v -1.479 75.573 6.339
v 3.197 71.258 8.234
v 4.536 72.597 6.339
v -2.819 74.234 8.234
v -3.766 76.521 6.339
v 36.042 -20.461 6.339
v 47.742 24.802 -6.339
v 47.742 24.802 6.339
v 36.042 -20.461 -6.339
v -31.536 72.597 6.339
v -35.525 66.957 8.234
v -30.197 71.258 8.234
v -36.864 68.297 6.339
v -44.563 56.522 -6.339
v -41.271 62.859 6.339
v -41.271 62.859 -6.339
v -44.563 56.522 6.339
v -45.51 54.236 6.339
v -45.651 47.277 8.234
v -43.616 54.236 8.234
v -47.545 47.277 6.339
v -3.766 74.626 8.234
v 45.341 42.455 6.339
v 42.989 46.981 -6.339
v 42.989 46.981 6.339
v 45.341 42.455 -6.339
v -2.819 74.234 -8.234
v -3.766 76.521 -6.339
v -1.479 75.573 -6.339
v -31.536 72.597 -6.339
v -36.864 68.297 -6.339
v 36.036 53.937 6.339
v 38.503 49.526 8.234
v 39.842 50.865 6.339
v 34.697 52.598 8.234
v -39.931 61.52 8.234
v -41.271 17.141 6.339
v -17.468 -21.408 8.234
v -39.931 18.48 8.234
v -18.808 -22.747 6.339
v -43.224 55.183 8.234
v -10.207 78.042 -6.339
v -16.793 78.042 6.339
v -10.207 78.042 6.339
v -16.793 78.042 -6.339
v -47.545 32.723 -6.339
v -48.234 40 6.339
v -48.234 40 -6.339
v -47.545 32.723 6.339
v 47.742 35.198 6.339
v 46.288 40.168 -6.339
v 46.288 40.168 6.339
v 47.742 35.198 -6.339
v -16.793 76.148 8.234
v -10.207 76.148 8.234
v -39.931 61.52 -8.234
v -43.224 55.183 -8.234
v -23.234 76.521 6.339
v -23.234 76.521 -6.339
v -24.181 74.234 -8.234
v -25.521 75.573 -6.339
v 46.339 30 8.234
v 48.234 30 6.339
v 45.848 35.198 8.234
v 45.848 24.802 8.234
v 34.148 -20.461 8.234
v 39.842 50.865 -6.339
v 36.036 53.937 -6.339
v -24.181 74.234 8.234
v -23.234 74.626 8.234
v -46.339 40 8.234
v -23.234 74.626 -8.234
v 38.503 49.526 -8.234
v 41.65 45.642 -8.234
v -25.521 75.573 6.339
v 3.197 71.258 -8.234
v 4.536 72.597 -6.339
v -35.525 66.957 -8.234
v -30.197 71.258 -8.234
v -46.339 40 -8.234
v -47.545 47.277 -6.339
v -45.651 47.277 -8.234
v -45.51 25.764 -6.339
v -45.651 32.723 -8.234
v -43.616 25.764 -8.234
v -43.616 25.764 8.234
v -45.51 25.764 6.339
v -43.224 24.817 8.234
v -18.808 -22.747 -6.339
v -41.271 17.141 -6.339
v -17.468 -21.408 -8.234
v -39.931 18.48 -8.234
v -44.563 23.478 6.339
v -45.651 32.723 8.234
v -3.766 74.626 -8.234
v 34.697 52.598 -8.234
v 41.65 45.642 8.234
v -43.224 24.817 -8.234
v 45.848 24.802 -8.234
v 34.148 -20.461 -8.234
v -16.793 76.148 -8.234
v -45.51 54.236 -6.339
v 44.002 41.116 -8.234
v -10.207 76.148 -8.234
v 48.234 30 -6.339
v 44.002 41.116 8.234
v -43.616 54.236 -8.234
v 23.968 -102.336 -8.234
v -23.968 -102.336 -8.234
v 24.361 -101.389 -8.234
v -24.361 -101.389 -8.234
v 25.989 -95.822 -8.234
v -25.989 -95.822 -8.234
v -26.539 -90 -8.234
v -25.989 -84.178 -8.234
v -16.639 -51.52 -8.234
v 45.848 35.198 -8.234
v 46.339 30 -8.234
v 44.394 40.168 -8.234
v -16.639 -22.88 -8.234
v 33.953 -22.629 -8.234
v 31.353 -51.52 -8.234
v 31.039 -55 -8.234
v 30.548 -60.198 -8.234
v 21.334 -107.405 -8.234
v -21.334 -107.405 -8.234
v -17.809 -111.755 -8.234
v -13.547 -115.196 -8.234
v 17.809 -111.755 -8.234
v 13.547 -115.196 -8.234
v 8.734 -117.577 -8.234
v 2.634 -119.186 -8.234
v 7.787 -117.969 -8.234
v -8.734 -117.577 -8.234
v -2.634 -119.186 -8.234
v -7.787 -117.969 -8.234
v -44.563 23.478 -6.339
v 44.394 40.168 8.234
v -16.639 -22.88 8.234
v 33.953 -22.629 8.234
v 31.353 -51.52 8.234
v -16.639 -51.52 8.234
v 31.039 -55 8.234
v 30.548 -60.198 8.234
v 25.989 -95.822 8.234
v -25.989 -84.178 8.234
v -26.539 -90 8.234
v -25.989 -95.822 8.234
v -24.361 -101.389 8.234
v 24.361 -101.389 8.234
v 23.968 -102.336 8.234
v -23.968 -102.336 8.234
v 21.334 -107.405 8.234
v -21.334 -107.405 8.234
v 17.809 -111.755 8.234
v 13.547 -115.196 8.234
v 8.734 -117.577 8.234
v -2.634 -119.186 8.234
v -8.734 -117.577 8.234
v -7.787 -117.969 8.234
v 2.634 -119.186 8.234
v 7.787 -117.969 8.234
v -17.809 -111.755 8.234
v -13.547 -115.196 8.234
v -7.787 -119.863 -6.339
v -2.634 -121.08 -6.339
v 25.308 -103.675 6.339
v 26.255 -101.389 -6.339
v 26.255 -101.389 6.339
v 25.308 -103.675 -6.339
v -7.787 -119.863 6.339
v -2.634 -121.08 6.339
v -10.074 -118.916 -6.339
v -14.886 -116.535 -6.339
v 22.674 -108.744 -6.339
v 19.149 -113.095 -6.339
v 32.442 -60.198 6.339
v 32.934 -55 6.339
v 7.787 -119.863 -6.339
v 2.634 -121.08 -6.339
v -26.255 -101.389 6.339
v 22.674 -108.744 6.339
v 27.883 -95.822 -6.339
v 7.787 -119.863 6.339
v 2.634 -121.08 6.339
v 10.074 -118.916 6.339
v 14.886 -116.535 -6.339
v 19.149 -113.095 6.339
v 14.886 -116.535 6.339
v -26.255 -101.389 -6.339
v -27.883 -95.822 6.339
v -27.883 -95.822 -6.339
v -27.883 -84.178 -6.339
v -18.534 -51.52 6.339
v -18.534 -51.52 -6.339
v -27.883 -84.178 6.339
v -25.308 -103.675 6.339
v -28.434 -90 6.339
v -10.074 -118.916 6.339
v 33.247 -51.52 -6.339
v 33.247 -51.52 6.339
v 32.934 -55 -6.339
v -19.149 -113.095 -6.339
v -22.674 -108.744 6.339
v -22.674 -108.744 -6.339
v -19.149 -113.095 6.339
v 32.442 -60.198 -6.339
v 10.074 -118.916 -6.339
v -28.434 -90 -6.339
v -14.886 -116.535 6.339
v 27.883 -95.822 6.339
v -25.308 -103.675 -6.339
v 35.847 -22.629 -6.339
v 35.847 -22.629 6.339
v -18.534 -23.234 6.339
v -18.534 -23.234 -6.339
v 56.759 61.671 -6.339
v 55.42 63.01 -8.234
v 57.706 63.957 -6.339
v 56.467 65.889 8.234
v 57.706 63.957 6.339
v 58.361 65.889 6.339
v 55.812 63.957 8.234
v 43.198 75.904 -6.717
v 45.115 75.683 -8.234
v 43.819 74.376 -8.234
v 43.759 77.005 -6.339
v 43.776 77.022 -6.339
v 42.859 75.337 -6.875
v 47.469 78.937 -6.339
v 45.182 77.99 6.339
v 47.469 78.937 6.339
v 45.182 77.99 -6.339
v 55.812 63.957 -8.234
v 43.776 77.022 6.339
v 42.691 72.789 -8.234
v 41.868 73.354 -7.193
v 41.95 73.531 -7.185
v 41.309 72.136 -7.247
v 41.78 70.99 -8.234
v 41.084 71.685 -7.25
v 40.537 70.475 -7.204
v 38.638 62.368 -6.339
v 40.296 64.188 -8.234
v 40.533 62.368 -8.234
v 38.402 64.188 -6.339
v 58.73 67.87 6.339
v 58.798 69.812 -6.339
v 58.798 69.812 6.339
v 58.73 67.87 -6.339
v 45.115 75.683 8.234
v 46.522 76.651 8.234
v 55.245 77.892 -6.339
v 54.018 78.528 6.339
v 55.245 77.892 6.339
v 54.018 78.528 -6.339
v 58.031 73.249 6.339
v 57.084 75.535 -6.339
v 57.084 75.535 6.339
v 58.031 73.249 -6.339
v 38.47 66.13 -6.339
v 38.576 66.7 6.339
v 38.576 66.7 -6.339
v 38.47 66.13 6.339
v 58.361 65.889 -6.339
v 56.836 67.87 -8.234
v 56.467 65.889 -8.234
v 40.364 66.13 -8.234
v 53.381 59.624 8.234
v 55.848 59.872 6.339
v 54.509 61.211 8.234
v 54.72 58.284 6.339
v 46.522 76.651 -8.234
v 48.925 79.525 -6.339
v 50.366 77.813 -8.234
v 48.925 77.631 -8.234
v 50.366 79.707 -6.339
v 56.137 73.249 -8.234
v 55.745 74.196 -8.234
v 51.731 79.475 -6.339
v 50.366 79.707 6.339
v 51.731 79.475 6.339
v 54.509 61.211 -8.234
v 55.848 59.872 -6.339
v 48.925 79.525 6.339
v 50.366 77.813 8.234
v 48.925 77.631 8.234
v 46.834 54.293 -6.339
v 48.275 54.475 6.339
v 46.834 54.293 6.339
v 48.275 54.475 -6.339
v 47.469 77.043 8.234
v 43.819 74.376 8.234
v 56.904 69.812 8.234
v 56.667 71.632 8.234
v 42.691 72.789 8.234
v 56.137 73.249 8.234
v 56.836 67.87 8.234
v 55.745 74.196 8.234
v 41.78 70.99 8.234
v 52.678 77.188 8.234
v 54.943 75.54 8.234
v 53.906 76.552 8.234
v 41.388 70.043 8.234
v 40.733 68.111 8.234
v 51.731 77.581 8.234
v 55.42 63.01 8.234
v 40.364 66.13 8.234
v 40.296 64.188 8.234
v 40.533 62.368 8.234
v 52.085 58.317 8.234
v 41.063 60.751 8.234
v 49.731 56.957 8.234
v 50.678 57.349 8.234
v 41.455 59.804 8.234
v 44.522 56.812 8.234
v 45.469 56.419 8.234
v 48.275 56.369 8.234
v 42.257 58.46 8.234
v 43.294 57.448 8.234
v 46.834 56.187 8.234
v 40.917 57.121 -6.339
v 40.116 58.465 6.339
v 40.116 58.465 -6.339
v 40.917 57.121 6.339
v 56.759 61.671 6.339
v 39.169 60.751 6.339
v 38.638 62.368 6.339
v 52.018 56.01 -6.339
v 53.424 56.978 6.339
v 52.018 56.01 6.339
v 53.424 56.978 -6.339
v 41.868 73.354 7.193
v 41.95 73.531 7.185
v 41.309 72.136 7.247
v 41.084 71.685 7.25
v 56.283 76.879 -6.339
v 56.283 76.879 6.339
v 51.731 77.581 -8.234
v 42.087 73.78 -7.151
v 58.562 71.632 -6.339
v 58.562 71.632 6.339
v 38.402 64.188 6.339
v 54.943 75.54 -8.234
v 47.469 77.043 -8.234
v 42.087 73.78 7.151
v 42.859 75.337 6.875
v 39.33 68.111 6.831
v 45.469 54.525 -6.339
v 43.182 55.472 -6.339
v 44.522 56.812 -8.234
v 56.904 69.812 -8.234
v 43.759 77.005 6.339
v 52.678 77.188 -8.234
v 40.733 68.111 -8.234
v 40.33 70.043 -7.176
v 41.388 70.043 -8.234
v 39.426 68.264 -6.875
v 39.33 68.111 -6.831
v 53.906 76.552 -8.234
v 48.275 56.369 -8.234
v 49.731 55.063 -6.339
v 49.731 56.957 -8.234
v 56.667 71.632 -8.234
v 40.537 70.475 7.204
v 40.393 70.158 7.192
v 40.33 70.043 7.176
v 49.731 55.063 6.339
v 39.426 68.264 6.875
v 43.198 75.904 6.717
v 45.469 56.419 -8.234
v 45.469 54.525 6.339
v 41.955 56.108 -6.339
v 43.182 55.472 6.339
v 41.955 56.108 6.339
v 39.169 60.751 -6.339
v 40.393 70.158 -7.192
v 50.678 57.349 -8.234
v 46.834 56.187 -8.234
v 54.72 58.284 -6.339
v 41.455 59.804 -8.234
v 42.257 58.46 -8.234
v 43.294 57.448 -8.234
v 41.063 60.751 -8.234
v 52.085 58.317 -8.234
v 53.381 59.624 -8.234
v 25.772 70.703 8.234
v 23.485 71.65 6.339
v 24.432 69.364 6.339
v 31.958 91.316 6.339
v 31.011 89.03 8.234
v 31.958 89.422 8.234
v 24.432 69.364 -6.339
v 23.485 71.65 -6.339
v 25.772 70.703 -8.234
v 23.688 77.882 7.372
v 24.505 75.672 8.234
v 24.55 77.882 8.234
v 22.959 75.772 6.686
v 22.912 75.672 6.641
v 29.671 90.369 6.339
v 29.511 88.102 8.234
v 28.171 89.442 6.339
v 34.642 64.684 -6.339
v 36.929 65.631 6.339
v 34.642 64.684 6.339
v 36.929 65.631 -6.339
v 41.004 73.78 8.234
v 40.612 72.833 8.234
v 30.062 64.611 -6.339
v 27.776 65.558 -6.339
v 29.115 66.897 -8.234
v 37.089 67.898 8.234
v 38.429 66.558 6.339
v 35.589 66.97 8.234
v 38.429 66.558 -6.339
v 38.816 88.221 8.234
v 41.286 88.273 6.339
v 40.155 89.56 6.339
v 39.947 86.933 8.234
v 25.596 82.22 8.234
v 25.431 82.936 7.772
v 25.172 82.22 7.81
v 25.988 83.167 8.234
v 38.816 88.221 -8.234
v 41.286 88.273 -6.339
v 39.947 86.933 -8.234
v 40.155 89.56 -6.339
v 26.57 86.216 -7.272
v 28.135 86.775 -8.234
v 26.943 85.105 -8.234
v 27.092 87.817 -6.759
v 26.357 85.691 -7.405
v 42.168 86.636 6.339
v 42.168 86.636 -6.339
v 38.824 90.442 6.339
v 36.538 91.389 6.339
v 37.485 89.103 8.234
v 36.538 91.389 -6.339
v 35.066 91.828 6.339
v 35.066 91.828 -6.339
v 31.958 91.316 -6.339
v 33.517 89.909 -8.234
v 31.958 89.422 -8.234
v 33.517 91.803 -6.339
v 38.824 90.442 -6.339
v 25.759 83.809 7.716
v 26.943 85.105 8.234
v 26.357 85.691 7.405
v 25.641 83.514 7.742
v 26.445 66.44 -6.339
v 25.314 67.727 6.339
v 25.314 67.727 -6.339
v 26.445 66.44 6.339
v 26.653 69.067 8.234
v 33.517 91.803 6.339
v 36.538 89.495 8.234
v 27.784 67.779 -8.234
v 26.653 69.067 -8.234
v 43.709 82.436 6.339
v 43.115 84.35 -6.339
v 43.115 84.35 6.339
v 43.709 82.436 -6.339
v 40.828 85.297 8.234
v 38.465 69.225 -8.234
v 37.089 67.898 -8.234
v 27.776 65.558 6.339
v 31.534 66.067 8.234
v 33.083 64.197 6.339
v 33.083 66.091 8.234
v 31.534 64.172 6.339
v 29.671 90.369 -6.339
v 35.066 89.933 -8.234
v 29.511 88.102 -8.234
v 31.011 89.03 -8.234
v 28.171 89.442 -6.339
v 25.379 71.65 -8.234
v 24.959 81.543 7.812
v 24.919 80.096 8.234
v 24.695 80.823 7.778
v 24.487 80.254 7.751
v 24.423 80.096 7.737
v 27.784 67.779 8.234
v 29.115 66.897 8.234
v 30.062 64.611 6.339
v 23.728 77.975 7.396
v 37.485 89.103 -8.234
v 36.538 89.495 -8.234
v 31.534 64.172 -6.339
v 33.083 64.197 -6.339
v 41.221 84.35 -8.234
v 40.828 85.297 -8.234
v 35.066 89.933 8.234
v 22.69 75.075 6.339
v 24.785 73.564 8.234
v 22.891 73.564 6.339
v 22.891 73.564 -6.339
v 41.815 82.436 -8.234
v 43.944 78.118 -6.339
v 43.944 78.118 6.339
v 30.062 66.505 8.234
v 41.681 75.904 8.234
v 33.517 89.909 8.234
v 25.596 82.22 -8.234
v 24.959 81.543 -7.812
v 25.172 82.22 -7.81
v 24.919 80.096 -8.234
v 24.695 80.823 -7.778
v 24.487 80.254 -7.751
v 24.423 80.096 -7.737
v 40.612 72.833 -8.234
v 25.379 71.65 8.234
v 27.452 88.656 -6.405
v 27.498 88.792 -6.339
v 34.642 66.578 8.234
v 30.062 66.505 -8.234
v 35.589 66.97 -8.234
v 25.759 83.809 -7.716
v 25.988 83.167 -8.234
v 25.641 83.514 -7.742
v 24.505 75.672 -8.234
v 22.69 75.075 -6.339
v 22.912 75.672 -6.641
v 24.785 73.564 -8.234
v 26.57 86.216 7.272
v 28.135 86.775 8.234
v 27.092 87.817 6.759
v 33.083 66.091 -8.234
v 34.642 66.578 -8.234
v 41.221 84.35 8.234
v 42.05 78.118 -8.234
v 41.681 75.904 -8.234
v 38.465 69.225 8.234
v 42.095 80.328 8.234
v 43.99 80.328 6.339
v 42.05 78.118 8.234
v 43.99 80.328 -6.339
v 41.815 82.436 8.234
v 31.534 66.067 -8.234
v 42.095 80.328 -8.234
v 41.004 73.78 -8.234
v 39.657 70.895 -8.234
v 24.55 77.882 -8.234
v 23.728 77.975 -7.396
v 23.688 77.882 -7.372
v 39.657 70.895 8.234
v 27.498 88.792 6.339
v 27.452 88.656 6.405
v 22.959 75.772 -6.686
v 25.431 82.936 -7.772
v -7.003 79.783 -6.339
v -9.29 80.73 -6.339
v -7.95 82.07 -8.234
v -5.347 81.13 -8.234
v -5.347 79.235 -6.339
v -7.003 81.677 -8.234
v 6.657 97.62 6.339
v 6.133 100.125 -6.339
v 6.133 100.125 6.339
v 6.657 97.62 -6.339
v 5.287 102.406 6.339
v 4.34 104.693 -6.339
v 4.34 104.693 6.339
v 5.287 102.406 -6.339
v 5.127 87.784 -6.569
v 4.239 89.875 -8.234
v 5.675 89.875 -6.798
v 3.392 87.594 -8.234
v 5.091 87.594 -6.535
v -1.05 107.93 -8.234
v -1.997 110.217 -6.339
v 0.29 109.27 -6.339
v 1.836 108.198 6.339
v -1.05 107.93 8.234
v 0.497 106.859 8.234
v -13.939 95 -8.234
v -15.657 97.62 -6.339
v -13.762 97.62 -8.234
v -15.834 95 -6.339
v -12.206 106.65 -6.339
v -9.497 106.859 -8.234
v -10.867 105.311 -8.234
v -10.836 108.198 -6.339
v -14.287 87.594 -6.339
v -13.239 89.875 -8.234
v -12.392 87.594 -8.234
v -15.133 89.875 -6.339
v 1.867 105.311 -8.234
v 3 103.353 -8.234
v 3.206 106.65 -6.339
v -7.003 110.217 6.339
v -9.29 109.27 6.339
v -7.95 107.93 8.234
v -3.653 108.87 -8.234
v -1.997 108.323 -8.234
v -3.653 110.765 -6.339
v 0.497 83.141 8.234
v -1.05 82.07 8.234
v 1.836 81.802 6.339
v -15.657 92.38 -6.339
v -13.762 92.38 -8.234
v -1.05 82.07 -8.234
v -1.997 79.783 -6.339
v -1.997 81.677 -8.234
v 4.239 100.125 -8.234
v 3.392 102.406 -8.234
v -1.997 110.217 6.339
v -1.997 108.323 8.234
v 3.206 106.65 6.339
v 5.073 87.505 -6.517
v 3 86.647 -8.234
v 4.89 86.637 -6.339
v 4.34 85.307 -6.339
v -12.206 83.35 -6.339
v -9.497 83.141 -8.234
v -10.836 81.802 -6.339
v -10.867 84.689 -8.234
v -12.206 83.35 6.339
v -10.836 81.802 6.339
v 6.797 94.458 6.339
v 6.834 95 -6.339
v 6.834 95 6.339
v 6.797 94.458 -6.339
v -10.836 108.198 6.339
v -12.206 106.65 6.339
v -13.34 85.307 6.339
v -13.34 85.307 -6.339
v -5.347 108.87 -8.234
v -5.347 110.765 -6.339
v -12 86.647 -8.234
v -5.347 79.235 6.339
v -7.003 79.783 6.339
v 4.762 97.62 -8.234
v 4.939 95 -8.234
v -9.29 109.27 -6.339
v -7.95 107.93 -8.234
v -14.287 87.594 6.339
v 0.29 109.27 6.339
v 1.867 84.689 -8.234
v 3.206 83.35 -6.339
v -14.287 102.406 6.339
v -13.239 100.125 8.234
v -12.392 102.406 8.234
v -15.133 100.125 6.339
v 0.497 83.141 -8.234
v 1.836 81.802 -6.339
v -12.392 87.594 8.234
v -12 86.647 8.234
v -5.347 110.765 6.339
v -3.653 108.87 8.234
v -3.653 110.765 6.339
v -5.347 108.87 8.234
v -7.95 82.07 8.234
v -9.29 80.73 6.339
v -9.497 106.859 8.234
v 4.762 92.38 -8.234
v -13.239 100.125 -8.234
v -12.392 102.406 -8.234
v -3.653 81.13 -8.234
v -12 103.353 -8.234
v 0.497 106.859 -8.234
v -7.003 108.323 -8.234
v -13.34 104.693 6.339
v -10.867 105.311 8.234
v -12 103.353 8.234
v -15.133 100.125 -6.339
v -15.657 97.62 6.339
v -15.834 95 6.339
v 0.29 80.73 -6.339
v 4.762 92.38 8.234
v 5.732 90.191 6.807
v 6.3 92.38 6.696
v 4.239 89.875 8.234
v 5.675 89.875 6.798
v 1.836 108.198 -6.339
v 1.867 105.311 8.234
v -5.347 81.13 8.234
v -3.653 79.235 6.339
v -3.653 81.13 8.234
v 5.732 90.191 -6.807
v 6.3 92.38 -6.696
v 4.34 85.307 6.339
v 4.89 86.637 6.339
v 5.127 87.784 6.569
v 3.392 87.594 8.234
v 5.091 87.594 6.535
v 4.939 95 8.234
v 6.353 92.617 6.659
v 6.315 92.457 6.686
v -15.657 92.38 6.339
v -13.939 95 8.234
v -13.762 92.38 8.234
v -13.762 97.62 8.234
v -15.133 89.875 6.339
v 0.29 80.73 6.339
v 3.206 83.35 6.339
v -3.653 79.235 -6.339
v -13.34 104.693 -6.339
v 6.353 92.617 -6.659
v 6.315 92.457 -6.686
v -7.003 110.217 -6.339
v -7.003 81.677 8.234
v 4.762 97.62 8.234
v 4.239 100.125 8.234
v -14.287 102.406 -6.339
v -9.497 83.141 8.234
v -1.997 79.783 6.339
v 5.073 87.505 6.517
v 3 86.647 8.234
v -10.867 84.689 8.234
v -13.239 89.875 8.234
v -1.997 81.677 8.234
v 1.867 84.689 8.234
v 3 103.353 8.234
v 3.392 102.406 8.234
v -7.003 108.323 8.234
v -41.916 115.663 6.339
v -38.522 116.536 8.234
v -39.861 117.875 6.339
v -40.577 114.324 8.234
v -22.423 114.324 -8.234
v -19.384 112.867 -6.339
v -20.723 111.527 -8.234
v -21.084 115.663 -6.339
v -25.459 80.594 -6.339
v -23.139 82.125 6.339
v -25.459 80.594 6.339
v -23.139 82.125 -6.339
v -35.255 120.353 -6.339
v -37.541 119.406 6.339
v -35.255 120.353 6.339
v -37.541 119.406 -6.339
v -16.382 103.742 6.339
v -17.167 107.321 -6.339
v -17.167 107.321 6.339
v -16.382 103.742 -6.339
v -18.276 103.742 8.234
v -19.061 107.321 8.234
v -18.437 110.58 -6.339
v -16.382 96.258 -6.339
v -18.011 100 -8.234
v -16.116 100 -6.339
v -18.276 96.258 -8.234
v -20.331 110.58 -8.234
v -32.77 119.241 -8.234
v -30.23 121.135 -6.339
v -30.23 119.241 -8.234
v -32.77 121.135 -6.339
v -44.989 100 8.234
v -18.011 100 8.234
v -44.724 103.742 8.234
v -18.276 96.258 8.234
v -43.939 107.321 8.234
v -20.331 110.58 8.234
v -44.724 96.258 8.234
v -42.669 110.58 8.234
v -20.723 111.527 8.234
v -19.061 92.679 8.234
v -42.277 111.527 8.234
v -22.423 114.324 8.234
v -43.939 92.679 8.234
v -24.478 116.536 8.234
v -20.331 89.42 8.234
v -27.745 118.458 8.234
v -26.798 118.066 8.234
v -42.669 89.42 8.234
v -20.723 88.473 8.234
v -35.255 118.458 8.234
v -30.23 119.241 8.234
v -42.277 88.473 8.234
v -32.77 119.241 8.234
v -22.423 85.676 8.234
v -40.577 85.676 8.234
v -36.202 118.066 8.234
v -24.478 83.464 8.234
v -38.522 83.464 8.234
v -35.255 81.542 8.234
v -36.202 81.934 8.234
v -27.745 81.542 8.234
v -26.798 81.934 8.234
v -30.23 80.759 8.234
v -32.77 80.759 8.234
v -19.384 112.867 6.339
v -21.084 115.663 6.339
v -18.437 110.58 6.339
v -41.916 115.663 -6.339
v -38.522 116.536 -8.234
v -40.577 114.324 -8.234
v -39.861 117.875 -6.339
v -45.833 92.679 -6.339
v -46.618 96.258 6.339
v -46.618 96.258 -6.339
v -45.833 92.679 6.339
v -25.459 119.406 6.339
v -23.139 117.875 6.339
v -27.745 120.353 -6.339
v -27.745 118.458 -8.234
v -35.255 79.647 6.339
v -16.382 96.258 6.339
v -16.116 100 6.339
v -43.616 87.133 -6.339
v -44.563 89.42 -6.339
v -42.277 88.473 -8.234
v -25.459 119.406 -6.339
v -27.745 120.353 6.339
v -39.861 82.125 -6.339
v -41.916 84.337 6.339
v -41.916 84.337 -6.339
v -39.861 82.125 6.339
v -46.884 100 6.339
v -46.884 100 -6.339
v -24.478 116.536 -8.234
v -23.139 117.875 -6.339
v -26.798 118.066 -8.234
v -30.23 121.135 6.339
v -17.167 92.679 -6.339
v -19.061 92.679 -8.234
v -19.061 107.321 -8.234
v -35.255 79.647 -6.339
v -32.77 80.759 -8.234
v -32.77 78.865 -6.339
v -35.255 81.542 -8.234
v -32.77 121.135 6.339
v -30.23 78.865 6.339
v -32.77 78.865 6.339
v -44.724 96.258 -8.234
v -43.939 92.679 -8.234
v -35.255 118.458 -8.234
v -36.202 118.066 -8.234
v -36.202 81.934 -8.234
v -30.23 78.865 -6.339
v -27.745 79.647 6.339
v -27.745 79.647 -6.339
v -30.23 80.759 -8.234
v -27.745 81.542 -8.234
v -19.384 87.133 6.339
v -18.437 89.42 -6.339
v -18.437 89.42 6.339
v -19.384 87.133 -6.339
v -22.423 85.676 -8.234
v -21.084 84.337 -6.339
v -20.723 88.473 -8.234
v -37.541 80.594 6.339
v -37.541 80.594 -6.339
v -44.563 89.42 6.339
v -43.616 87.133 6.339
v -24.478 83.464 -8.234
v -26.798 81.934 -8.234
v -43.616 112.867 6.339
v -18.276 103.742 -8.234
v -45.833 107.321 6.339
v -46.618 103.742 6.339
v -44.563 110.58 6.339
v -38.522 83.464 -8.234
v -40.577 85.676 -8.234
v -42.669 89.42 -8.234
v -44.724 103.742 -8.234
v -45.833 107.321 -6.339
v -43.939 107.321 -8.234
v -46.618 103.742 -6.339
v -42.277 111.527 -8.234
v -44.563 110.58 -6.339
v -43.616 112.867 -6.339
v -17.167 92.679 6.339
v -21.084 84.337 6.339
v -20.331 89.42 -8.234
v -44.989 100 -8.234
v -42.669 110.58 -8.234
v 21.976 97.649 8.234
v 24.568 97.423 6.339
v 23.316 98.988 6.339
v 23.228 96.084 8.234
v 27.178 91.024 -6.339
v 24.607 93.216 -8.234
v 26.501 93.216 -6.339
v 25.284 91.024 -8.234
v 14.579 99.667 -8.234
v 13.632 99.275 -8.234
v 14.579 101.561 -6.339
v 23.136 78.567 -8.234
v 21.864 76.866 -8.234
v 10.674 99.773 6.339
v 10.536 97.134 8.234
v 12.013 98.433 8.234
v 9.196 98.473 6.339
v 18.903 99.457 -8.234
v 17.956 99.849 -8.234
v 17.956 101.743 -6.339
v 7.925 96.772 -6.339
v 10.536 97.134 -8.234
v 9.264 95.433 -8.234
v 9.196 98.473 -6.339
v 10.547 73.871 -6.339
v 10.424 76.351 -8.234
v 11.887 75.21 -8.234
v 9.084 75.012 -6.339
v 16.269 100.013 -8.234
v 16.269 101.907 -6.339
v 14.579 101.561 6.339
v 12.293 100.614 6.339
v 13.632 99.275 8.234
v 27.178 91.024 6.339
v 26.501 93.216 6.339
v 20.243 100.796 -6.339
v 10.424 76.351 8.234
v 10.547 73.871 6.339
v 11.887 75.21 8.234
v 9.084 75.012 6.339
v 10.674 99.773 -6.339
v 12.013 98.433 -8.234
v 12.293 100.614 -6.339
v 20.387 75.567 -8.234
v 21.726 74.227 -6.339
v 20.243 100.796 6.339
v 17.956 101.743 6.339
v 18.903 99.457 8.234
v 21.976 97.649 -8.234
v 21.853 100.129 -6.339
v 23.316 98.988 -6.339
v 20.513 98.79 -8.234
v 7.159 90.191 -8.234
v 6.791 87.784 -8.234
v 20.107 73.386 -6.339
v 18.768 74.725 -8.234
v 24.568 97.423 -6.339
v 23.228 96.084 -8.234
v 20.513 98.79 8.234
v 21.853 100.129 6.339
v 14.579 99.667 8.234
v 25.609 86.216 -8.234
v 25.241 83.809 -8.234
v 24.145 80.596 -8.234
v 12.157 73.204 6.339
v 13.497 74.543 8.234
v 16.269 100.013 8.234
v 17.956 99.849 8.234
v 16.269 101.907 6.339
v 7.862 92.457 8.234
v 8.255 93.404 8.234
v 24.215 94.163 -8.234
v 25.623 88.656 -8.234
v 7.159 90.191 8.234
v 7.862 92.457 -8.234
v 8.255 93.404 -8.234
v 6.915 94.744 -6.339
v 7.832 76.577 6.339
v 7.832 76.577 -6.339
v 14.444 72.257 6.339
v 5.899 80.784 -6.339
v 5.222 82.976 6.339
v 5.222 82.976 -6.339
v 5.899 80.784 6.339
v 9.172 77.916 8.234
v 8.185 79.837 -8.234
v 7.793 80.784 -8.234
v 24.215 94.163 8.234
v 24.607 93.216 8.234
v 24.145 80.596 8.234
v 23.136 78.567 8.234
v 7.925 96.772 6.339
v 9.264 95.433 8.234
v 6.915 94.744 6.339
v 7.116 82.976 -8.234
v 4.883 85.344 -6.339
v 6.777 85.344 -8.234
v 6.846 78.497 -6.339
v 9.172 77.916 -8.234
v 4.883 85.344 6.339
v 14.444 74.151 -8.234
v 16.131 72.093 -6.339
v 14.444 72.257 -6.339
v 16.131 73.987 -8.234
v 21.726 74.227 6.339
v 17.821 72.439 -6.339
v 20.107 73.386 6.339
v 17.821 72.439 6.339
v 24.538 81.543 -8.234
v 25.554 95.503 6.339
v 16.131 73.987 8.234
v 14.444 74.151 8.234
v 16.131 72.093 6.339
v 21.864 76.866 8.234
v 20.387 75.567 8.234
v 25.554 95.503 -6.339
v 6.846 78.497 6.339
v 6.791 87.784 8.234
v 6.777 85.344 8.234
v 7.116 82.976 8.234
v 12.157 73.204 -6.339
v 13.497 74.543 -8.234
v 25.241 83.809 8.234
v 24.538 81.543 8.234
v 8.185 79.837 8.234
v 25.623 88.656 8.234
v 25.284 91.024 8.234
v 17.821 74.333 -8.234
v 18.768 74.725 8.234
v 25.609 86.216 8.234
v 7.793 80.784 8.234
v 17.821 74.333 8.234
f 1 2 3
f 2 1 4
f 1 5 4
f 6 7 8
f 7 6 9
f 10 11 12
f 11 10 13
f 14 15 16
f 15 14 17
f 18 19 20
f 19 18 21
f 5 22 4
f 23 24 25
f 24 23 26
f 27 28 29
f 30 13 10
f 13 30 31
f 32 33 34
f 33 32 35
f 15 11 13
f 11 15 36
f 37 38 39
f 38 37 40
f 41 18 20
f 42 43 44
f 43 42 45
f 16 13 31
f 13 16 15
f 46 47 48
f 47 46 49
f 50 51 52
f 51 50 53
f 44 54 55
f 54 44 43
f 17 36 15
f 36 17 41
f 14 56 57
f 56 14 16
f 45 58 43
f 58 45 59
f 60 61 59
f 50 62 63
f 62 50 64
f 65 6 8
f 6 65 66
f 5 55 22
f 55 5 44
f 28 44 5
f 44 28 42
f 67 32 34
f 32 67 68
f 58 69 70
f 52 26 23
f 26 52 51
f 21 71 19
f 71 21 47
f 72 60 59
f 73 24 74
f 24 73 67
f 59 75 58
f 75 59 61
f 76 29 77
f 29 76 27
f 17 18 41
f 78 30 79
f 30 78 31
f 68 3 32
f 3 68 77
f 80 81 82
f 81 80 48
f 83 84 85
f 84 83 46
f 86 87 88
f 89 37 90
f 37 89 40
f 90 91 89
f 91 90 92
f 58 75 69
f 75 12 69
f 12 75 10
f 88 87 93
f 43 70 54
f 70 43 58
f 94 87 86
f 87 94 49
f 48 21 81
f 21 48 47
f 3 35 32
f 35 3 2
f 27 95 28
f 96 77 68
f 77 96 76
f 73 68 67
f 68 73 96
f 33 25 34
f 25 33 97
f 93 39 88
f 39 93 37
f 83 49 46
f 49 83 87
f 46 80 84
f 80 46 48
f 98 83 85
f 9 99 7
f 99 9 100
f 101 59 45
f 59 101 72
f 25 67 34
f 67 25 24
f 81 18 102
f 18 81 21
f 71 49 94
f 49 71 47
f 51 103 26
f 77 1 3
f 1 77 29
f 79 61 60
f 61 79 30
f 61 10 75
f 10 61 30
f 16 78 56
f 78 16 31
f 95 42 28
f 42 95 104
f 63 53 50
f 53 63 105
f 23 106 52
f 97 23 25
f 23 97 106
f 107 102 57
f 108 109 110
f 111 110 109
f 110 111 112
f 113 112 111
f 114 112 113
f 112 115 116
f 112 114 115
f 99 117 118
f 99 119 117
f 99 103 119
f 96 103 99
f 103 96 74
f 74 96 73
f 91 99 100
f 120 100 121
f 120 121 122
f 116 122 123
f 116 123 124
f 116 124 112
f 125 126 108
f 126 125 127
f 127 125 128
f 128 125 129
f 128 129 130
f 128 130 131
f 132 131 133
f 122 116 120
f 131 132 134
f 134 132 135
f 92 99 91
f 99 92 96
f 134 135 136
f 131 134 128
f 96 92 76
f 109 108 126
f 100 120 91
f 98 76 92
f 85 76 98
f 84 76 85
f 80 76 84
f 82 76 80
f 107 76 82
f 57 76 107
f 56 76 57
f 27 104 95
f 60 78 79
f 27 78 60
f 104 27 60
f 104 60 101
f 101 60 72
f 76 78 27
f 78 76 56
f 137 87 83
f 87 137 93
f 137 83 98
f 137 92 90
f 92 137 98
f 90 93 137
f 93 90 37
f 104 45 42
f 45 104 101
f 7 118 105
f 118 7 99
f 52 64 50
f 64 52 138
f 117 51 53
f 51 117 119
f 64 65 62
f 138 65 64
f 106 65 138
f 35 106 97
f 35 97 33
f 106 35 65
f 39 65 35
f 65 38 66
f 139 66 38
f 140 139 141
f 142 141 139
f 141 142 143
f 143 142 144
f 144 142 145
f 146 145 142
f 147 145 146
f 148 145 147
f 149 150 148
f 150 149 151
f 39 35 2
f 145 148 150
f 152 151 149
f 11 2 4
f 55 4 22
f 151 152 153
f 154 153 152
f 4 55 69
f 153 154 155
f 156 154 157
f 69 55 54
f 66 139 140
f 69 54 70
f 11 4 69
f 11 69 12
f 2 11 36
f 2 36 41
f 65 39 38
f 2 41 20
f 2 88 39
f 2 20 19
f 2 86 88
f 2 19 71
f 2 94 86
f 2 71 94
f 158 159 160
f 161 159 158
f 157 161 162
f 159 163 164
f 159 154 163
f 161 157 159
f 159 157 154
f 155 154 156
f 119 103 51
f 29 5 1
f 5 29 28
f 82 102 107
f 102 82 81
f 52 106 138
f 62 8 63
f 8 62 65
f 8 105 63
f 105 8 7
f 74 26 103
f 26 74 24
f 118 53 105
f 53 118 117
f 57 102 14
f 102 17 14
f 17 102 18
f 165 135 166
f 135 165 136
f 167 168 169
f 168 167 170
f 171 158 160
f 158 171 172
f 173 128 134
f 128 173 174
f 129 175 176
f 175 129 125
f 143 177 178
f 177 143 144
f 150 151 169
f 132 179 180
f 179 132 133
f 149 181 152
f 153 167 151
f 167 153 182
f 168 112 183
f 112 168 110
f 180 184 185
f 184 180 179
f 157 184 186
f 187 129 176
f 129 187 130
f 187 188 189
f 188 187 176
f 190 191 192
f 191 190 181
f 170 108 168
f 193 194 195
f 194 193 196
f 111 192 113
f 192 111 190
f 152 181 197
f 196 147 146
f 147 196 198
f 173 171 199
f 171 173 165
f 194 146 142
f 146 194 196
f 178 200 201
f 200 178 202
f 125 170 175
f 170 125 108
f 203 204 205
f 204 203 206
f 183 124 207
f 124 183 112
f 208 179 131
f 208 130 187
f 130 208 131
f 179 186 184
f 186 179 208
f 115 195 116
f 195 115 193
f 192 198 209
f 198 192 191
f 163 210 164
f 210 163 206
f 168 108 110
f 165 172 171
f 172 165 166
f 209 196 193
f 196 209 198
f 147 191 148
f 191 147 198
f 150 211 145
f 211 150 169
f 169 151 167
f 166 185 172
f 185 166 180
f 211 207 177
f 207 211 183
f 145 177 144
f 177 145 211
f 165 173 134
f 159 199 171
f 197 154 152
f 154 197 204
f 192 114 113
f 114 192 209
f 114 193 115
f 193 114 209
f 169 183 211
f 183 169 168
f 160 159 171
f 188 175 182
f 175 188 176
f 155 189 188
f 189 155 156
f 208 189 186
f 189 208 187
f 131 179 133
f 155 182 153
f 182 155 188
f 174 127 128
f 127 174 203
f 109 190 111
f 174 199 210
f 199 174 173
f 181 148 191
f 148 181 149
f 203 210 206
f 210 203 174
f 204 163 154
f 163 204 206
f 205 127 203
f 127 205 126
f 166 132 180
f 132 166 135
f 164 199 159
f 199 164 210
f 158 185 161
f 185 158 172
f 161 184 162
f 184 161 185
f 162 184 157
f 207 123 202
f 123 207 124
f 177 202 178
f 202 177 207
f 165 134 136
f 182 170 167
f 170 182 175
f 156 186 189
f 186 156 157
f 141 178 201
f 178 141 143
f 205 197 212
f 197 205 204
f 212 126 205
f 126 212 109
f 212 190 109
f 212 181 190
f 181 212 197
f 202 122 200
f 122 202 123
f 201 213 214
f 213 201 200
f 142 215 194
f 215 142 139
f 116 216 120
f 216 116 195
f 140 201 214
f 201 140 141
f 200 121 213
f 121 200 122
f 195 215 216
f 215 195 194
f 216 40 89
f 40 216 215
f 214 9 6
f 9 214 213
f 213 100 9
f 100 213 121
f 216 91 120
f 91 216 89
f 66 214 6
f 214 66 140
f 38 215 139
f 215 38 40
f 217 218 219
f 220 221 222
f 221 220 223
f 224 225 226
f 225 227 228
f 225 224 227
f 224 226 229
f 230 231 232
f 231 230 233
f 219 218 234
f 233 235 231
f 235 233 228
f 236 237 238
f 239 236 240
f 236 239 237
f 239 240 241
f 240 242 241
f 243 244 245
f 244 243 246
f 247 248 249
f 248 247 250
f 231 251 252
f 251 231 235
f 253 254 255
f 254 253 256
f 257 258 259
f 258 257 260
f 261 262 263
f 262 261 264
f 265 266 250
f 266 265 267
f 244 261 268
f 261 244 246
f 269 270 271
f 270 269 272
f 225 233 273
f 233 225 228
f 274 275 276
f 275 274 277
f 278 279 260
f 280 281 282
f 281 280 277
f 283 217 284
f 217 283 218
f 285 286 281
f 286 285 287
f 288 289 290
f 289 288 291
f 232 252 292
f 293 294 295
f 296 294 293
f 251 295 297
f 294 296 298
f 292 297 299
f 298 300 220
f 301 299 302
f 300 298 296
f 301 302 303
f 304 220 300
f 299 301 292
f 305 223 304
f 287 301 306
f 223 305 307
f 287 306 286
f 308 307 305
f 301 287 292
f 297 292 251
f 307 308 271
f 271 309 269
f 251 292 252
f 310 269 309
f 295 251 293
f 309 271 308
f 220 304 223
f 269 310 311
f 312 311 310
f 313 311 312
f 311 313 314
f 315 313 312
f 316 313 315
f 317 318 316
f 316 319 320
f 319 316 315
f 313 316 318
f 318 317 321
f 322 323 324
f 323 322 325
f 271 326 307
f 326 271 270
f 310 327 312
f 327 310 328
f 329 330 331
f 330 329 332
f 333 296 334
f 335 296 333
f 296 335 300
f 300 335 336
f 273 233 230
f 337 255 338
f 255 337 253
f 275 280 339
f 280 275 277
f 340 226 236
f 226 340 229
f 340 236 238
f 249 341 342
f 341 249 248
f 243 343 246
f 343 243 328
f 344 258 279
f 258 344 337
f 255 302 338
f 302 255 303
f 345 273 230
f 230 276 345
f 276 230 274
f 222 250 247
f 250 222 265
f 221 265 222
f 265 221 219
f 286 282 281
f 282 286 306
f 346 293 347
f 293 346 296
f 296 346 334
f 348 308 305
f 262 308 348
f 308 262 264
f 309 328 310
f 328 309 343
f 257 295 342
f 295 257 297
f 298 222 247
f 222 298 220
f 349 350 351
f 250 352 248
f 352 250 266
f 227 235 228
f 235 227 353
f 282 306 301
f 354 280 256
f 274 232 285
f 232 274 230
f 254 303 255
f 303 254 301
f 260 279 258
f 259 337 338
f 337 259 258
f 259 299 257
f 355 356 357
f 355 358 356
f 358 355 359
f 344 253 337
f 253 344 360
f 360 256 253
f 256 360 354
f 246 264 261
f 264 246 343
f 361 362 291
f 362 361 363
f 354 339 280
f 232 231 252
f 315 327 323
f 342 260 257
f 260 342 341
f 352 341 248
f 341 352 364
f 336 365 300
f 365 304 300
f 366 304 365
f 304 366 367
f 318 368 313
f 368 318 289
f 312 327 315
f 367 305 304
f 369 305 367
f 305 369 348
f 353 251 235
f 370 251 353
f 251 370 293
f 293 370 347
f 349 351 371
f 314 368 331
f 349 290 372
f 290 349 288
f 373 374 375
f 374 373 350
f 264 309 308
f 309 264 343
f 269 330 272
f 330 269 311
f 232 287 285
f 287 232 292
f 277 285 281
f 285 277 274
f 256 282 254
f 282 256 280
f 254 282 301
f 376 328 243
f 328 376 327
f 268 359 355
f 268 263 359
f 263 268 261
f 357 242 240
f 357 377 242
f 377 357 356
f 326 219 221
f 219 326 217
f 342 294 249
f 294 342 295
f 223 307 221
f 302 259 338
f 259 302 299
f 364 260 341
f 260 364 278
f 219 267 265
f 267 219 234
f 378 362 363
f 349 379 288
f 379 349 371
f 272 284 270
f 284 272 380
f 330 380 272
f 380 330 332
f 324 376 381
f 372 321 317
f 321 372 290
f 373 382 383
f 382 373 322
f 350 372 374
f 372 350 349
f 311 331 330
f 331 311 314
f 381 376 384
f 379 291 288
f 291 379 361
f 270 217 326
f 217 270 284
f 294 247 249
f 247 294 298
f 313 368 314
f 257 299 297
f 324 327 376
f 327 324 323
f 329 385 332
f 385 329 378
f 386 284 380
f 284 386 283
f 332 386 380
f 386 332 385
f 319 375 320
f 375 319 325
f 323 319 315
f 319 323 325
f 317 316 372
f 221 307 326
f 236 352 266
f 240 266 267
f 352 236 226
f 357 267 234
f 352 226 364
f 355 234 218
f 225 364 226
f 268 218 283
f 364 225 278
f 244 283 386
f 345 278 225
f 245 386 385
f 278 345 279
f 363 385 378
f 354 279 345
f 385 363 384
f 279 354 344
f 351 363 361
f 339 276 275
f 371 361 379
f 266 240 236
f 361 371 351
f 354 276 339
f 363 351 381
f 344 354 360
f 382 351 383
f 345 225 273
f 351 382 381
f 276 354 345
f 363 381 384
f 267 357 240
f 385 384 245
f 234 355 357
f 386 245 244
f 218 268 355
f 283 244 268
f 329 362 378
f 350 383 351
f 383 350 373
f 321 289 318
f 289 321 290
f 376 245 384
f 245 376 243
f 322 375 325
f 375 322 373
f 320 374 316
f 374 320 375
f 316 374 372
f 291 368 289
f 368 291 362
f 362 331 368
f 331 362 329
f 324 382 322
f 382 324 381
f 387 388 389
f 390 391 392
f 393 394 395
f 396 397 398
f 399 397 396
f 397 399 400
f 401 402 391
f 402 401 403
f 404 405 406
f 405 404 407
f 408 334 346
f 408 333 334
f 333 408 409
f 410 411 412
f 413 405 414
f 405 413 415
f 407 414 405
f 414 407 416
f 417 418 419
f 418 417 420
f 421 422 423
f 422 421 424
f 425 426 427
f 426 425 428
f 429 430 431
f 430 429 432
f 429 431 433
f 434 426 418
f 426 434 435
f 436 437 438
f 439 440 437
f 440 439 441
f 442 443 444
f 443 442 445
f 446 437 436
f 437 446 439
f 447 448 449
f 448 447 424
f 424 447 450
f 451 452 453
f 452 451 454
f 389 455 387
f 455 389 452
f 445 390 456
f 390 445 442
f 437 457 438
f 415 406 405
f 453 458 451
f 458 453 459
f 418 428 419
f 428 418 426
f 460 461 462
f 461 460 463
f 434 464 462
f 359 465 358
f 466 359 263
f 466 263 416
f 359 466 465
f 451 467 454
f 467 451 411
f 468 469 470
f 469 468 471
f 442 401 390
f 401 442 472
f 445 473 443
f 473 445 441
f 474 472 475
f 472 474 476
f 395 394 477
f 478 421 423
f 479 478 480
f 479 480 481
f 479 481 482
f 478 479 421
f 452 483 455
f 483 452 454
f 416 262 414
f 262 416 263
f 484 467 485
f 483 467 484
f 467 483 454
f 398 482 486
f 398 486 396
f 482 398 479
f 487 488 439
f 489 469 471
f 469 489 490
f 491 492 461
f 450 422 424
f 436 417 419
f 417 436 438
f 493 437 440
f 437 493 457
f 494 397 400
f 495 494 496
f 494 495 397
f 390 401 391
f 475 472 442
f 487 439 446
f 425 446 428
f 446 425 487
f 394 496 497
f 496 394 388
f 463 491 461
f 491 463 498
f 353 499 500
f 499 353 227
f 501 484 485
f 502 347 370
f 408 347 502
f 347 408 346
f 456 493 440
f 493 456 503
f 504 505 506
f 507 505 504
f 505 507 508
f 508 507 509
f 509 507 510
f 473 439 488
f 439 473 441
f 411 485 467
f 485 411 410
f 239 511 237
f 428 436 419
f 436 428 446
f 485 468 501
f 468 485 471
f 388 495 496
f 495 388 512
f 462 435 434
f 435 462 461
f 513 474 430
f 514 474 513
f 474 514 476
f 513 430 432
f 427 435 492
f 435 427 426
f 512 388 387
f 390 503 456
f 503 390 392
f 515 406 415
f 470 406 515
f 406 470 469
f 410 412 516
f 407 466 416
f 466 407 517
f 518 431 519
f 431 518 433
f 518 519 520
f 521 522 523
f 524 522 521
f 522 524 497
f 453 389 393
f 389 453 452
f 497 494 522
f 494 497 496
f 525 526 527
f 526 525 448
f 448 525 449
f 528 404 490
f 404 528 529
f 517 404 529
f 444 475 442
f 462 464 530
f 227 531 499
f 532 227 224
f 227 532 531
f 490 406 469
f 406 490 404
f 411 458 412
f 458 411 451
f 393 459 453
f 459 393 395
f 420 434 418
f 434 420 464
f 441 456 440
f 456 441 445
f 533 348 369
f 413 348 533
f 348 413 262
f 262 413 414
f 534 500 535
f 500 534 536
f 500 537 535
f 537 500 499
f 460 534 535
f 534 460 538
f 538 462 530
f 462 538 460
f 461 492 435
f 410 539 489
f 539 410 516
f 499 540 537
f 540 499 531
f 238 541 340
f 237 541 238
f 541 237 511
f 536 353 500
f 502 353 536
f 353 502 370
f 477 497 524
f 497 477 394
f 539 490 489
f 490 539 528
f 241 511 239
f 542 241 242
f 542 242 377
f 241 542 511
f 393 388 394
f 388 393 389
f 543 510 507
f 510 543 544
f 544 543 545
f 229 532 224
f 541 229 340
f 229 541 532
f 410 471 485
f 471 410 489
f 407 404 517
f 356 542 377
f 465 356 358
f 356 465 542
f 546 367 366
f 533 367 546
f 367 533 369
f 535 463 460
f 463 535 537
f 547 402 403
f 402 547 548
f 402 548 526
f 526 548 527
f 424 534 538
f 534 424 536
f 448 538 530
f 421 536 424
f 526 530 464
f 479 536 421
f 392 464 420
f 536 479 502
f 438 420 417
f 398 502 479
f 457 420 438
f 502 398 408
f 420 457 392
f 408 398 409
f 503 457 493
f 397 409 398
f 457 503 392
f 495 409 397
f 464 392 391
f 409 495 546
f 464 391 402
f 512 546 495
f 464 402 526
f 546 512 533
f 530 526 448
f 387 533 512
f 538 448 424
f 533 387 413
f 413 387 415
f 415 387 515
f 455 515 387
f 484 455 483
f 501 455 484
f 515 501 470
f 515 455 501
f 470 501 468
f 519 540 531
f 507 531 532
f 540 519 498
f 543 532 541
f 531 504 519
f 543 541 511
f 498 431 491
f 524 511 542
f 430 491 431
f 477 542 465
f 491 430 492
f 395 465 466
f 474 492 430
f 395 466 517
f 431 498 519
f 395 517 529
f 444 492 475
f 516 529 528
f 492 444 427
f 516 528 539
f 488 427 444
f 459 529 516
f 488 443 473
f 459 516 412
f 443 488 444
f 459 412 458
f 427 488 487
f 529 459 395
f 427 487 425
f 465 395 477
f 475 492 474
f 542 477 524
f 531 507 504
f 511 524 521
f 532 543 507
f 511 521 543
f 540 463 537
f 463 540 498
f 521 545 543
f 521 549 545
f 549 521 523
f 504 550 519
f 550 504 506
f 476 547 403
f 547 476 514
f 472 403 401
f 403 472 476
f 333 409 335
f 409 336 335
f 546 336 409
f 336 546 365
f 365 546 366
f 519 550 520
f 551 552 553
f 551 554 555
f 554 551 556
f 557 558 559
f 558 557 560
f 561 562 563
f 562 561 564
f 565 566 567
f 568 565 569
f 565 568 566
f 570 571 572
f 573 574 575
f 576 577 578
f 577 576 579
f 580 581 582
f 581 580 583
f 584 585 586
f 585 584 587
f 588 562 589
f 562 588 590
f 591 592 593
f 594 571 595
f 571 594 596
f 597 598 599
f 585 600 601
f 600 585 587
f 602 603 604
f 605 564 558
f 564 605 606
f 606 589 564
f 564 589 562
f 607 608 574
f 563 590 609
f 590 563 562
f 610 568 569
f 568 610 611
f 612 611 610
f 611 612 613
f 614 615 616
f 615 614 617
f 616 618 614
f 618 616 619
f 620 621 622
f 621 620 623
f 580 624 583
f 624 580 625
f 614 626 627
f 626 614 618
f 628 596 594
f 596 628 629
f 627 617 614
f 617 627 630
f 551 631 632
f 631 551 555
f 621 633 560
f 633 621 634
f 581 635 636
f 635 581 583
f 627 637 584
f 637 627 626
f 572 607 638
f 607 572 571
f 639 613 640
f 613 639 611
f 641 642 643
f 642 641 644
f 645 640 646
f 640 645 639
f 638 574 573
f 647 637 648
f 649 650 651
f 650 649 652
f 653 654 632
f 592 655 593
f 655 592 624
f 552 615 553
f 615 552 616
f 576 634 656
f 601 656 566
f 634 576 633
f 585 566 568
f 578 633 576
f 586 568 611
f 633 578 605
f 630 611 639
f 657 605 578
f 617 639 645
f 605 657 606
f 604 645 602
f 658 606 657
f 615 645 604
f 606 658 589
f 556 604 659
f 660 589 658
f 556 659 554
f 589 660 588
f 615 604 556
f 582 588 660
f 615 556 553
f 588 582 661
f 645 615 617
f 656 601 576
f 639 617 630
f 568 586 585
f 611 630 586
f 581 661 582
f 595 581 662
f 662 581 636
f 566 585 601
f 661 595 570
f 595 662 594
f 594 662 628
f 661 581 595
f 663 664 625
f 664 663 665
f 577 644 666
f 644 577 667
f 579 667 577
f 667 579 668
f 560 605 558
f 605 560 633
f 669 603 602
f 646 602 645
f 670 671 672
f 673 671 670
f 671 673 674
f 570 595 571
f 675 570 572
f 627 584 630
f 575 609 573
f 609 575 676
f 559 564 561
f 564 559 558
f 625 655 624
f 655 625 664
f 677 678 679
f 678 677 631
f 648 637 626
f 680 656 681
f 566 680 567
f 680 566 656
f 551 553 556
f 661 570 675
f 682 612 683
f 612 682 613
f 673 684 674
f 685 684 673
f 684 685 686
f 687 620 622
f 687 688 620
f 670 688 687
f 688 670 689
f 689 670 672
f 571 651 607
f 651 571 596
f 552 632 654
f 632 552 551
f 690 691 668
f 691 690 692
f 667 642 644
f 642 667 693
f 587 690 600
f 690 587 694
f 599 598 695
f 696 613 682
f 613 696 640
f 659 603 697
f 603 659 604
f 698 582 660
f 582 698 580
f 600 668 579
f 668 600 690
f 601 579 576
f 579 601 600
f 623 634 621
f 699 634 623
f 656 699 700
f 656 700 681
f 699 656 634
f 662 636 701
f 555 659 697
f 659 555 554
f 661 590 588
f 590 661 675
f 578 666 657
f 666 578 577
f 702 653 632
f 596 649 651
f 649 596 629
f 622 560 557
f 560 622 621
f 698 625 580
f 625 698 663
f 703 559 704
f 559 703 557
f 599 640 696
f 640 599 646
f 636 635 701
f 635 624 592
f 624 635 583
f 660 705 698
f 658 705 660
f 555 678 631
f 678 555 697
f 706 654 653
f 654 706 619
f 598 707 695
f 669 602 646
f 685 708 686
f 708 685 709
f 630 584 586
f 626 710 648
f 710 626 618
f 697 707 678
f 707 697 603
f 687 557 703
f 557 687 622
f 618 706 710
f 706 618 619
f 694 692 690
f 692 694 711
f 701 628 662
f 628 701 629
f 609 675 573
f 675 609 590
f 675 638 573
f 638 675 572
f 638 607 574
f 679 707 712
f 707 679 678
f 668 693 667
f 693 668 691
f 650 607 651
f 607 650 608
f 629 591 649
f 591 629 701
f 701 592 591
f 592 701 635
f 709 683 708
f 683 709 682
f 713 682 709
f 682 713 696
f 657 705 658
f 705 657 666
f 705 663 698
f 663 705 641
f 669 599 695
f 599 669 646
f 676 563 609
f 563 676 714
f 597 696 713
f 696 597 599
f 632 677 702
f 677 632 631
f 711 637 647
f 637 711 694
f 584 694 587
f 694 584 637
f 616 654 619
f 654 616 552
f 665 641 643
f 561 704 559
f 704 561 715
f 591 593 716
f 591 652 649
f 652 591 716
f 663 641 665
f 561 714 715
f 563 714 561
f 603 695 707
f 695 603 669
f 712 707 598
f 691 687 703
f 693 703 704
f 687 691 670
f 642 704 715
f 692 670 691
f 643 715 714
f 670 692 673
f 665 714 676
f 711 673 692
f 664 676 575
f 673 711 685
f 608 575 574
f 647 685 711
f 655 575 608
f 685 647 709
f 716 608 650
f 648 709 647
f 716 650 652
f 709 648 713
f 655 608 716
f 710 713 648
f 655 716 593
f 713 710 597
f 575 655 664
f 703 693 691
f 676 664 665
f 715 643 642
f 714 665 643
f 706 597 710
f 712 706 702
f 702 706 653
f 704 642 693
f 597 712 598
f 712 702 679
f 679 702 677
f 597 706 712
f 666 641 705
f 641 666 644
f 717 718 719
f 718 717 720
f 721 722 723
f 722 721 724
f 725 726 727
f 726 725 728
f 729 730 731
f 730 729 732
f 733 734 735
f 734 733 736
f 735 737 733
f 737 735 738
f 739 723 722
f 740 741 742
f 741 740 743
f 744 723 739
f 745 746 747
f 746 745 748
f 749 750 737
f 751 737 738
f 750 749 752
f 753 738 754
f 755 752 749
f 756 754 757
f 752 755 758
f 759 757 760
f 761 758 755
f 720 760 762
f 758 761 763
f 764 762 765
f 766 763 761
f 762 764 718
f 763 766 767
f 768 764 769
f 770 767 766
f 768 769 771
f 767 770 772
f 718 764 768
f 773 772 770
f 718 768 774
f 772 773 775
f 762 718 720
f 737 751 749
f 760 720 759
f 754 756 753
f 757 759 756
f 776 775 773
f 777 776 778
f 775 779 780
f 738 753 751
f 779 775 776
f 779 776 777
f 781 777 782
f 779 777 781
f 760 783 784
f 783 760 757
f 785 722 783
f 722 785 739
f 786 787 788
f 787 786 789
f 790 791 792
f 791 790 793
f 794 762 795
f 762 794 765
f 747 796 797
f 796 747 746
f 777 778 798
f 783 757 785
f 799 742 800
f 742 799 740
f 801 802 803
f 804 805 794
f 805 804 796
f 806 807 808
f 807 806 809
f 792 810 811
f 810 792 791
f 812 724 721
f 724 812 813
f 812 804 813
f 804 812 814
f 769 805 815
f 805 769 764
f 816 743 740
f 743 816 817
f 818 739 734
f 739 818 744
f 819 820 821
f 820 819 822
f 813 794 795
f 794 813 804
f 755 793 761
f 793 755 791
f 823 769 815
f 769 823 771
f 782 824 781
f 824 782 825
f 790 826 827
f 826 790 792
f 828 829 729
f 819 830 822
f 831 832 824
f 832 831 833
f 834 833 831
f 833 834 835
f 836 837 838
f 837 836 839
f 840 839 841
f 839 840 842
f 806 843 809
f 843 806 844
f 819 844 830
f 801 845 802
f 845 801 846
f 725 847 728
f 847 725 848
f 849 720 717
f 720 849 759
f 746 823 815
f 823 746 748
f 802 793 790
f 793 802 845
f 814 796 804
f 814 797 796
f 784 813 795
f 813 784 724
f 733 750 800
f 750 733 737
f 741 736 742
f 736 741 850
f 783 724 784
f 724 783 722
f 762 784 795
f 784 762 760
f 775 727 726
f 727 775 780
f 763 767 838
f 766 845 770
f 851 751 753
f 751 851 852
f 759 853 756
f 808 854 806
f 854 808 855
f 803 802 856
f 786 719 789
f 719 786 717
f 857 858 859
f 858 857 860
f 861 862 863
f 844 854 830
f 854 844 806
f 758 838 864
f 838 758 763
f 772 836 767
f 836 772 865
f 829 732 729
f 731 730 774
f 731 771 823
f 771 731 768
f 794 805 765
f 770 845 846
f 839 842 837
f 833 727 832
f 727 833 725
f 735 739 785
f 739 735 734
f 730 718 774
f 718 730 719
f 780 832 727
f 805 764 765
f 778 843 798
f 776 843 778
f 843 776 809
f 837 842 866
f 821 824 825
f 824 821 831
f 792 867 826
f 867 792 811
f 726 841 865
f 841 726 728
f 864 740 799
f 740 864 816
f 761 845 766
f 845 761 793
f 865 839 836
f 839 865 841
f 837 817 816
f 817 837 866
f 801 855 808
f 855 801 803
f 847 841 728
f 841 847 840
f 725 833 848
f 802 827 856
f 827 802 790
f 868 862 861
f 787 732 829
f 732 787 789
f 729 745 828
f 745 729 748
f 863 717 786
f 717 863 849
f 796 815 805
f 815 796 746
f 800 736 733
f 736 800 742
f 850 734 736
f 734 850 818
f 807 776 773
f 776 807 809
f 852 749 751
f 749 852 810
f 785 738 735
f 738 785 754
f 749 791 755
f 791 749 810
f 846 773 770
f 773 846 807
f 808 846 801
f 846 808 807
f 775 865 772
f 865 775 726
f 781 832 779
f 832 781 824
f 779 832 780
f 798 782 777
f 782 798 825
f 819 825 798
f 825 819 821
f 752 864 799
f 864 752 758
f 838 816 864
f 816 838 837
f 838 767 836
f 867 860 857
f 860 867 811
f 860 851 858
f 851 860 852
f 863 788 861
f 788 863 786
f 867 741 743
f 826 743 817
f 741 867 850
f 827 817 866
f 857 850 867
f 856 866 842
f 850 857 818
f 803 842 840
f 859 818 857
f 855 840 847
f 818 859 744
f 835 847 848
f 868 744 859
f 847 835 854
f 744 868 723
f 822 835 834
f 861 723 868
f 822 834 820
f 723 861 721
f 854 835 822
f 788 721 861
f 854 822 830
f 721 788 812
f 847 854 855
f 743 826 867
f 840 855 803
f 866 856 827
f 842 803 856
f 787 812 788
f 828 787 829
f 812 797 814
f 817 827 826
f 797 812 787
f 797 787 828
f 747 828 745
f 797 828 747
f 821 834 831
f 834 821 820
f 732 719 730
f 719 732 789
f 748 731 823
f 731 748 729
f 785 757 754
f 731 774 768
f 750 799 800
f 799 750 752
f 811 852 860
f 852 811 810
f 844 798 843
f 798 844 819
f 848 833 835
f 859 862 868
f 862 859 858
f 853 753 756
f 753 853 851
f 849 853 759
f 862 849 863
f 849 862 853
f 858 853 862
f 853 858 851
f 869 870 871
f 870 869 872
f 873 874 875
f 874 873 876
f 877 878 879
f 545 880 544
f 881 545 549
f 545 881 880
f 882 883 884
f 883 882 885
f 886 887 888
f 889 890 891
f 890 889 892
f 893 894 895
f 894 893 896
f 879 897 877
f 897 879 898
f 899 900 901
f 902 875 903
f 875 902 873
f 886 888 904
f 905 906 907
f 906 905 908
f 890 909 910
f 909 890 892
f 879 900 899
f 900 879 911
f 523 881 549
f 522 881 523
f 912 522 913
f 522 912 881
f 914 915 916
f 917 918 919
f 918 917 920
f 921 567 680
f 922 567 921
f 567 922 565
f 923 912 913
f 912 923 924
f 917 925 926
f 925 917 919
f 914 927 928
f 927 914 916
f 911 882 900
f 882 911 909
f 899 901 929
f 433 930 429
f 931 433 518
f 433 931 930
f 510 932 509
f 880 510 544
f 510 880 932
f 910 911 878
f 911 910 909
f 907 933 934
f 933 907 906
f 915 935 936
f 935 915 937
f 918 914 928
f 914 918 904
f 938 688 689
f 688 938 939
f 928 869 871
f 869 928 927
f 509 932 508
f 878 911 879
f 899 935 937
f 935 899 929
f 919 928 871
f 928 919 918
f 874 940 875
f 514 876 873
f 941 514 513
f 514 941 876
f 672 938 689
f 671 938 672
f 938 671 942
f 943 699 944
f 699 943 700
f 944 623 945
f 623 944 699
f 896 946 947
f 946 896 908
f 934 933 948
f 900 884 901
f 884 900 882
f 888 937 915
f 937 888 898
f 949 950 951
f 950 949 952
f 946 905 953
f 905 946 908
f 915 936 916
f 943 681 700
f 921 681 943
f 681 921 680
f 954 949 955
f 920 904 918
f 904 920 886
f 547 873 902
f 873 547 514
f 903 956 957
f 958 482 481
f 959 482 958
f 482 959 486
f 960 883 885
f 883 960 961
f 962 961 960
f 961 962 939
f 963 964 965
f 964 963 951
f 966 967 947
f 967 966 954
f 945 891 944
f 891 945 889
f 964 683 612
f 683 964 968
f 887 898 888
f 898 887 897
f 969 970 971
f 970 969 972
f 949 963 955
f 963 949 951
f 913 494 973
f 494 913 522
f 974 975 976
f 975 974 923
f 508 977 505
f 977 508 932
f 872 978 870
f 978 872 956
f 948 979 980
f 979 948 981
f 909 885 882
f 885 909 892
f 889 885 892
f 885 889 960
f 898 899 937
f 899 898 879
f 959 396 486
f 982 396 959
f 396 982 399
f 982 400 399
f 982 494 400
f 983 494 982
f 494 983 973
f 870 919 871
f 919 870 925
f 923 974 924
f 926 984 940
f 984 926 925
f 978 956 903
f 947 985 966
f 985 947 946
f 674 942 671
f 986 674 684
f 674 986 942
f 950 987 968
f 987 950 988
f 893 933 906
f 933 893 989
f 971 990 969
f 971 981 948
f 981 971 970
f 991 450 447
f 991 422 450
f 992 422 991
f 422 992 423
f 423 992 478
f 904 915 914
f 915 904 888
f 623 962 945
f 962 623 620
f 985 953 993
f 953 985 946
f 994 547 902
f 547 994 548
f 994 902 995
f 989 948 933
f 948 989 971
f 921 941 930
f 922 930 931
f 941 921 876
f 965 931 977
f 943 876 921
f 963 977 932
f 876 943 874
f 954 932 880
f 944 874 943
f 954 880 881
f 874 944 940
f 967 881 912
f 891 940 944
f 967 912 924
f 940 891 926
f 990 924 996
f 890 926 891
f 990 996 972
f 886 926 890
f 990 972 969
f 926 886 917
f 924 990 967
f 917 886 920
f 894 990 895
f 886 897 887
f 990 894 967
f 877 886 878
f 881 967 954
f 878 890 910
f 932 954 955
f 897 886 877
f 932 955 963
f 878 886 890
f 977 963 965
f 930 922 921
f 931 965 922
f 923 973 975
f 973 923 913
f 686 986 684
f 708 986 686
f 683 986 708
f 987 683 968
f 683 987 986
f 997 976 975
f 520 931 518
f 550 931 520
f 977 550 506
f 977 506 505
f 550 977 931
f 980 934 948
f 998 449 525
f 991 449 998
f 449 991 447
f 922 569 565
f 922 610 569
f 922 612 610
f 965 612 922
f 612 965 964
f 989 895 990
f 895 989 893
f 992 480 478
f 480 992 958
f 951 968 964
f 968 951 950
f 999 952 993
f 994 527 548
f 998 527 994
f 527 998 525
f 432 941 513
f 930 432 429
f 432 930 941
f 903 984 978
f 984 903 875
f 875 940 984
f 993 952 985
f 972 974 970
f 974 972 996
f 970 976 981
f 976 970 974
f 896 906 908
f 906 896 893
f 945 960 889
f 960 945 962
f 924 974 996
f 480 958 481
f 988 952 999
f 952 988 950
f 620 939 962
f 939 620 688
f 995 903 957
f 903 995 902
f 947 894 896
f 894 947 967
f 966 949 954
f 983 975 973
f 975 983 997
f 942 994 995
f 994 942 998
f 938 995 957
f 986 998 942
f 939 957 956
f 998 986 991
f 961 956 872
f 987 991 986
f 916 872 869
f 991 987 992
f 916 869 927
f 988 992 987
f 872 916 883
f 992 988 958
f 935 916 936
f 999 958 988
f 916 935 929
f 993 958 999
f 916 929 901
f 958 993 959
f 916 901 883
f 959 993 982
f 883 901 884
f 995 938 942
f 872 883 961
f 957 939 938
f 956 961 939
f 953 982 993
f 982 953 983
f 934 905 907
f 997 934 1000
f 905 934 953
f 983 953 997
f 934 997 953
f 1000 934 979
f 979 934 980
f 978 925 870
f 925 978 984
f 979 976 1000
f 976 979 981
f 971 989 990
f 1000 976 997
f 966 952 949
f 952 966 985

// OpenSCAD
module base()
{
    hull()
    {
        cylinder(r=28, h=10, center=true);  
        translate([+8,35,0]) cylinder(r=25, h=10, center=true); 
    }
    
    hull()
    {
        translate([+8,35,0]) cylinder(r=25, h=10, center=true); 
        translate([+10,75,0]) cylinder(r=27, h=10, center=true); 
    }

    hull()
    { 
        translate([+10,75,0]) cylinder(r=27, h=10, center=true); 
        translate([-15,130,0]) cylinder(r=35, h=10, center=true);
        translate([+25,120,0]) cylinder(r=25, h=10, center=true); 
    }

    hull()
    {
       
    }
}

module toes()
{
    translate ([-35,0,0]) scale([0.75,1,1]) cylinder(r=18, h=10, center=true);
    translate ([-5,-5,0]) scale([.5,.7,1]) cylinder(r=18, h=10, center=true);
    translate ([+18,-13,0]) rotate([0,0,-5]) scale([.5,.65,1]) cylinder(r=18, h=10, center=true);
    translate ([+37,-22,0]) rotate([0,0,-15]) scale([.45,.60,1]) cylinder(r=18, h=10, center=true);
    translate ([+54,-33,0]) rotate([0,0,-25]) scale([.4,.55,1]) cylinder(r=18, h=10, center=true);
}

module foot()
{
    minkowski()
    {
        sphere(r = 3.5, $fn = 8);
        translate([0,-90,0]) scale([.9,1,1])
        {
            base();
            translate([0, 190, 0]) toes();
        }
    }
}

foot(); 
